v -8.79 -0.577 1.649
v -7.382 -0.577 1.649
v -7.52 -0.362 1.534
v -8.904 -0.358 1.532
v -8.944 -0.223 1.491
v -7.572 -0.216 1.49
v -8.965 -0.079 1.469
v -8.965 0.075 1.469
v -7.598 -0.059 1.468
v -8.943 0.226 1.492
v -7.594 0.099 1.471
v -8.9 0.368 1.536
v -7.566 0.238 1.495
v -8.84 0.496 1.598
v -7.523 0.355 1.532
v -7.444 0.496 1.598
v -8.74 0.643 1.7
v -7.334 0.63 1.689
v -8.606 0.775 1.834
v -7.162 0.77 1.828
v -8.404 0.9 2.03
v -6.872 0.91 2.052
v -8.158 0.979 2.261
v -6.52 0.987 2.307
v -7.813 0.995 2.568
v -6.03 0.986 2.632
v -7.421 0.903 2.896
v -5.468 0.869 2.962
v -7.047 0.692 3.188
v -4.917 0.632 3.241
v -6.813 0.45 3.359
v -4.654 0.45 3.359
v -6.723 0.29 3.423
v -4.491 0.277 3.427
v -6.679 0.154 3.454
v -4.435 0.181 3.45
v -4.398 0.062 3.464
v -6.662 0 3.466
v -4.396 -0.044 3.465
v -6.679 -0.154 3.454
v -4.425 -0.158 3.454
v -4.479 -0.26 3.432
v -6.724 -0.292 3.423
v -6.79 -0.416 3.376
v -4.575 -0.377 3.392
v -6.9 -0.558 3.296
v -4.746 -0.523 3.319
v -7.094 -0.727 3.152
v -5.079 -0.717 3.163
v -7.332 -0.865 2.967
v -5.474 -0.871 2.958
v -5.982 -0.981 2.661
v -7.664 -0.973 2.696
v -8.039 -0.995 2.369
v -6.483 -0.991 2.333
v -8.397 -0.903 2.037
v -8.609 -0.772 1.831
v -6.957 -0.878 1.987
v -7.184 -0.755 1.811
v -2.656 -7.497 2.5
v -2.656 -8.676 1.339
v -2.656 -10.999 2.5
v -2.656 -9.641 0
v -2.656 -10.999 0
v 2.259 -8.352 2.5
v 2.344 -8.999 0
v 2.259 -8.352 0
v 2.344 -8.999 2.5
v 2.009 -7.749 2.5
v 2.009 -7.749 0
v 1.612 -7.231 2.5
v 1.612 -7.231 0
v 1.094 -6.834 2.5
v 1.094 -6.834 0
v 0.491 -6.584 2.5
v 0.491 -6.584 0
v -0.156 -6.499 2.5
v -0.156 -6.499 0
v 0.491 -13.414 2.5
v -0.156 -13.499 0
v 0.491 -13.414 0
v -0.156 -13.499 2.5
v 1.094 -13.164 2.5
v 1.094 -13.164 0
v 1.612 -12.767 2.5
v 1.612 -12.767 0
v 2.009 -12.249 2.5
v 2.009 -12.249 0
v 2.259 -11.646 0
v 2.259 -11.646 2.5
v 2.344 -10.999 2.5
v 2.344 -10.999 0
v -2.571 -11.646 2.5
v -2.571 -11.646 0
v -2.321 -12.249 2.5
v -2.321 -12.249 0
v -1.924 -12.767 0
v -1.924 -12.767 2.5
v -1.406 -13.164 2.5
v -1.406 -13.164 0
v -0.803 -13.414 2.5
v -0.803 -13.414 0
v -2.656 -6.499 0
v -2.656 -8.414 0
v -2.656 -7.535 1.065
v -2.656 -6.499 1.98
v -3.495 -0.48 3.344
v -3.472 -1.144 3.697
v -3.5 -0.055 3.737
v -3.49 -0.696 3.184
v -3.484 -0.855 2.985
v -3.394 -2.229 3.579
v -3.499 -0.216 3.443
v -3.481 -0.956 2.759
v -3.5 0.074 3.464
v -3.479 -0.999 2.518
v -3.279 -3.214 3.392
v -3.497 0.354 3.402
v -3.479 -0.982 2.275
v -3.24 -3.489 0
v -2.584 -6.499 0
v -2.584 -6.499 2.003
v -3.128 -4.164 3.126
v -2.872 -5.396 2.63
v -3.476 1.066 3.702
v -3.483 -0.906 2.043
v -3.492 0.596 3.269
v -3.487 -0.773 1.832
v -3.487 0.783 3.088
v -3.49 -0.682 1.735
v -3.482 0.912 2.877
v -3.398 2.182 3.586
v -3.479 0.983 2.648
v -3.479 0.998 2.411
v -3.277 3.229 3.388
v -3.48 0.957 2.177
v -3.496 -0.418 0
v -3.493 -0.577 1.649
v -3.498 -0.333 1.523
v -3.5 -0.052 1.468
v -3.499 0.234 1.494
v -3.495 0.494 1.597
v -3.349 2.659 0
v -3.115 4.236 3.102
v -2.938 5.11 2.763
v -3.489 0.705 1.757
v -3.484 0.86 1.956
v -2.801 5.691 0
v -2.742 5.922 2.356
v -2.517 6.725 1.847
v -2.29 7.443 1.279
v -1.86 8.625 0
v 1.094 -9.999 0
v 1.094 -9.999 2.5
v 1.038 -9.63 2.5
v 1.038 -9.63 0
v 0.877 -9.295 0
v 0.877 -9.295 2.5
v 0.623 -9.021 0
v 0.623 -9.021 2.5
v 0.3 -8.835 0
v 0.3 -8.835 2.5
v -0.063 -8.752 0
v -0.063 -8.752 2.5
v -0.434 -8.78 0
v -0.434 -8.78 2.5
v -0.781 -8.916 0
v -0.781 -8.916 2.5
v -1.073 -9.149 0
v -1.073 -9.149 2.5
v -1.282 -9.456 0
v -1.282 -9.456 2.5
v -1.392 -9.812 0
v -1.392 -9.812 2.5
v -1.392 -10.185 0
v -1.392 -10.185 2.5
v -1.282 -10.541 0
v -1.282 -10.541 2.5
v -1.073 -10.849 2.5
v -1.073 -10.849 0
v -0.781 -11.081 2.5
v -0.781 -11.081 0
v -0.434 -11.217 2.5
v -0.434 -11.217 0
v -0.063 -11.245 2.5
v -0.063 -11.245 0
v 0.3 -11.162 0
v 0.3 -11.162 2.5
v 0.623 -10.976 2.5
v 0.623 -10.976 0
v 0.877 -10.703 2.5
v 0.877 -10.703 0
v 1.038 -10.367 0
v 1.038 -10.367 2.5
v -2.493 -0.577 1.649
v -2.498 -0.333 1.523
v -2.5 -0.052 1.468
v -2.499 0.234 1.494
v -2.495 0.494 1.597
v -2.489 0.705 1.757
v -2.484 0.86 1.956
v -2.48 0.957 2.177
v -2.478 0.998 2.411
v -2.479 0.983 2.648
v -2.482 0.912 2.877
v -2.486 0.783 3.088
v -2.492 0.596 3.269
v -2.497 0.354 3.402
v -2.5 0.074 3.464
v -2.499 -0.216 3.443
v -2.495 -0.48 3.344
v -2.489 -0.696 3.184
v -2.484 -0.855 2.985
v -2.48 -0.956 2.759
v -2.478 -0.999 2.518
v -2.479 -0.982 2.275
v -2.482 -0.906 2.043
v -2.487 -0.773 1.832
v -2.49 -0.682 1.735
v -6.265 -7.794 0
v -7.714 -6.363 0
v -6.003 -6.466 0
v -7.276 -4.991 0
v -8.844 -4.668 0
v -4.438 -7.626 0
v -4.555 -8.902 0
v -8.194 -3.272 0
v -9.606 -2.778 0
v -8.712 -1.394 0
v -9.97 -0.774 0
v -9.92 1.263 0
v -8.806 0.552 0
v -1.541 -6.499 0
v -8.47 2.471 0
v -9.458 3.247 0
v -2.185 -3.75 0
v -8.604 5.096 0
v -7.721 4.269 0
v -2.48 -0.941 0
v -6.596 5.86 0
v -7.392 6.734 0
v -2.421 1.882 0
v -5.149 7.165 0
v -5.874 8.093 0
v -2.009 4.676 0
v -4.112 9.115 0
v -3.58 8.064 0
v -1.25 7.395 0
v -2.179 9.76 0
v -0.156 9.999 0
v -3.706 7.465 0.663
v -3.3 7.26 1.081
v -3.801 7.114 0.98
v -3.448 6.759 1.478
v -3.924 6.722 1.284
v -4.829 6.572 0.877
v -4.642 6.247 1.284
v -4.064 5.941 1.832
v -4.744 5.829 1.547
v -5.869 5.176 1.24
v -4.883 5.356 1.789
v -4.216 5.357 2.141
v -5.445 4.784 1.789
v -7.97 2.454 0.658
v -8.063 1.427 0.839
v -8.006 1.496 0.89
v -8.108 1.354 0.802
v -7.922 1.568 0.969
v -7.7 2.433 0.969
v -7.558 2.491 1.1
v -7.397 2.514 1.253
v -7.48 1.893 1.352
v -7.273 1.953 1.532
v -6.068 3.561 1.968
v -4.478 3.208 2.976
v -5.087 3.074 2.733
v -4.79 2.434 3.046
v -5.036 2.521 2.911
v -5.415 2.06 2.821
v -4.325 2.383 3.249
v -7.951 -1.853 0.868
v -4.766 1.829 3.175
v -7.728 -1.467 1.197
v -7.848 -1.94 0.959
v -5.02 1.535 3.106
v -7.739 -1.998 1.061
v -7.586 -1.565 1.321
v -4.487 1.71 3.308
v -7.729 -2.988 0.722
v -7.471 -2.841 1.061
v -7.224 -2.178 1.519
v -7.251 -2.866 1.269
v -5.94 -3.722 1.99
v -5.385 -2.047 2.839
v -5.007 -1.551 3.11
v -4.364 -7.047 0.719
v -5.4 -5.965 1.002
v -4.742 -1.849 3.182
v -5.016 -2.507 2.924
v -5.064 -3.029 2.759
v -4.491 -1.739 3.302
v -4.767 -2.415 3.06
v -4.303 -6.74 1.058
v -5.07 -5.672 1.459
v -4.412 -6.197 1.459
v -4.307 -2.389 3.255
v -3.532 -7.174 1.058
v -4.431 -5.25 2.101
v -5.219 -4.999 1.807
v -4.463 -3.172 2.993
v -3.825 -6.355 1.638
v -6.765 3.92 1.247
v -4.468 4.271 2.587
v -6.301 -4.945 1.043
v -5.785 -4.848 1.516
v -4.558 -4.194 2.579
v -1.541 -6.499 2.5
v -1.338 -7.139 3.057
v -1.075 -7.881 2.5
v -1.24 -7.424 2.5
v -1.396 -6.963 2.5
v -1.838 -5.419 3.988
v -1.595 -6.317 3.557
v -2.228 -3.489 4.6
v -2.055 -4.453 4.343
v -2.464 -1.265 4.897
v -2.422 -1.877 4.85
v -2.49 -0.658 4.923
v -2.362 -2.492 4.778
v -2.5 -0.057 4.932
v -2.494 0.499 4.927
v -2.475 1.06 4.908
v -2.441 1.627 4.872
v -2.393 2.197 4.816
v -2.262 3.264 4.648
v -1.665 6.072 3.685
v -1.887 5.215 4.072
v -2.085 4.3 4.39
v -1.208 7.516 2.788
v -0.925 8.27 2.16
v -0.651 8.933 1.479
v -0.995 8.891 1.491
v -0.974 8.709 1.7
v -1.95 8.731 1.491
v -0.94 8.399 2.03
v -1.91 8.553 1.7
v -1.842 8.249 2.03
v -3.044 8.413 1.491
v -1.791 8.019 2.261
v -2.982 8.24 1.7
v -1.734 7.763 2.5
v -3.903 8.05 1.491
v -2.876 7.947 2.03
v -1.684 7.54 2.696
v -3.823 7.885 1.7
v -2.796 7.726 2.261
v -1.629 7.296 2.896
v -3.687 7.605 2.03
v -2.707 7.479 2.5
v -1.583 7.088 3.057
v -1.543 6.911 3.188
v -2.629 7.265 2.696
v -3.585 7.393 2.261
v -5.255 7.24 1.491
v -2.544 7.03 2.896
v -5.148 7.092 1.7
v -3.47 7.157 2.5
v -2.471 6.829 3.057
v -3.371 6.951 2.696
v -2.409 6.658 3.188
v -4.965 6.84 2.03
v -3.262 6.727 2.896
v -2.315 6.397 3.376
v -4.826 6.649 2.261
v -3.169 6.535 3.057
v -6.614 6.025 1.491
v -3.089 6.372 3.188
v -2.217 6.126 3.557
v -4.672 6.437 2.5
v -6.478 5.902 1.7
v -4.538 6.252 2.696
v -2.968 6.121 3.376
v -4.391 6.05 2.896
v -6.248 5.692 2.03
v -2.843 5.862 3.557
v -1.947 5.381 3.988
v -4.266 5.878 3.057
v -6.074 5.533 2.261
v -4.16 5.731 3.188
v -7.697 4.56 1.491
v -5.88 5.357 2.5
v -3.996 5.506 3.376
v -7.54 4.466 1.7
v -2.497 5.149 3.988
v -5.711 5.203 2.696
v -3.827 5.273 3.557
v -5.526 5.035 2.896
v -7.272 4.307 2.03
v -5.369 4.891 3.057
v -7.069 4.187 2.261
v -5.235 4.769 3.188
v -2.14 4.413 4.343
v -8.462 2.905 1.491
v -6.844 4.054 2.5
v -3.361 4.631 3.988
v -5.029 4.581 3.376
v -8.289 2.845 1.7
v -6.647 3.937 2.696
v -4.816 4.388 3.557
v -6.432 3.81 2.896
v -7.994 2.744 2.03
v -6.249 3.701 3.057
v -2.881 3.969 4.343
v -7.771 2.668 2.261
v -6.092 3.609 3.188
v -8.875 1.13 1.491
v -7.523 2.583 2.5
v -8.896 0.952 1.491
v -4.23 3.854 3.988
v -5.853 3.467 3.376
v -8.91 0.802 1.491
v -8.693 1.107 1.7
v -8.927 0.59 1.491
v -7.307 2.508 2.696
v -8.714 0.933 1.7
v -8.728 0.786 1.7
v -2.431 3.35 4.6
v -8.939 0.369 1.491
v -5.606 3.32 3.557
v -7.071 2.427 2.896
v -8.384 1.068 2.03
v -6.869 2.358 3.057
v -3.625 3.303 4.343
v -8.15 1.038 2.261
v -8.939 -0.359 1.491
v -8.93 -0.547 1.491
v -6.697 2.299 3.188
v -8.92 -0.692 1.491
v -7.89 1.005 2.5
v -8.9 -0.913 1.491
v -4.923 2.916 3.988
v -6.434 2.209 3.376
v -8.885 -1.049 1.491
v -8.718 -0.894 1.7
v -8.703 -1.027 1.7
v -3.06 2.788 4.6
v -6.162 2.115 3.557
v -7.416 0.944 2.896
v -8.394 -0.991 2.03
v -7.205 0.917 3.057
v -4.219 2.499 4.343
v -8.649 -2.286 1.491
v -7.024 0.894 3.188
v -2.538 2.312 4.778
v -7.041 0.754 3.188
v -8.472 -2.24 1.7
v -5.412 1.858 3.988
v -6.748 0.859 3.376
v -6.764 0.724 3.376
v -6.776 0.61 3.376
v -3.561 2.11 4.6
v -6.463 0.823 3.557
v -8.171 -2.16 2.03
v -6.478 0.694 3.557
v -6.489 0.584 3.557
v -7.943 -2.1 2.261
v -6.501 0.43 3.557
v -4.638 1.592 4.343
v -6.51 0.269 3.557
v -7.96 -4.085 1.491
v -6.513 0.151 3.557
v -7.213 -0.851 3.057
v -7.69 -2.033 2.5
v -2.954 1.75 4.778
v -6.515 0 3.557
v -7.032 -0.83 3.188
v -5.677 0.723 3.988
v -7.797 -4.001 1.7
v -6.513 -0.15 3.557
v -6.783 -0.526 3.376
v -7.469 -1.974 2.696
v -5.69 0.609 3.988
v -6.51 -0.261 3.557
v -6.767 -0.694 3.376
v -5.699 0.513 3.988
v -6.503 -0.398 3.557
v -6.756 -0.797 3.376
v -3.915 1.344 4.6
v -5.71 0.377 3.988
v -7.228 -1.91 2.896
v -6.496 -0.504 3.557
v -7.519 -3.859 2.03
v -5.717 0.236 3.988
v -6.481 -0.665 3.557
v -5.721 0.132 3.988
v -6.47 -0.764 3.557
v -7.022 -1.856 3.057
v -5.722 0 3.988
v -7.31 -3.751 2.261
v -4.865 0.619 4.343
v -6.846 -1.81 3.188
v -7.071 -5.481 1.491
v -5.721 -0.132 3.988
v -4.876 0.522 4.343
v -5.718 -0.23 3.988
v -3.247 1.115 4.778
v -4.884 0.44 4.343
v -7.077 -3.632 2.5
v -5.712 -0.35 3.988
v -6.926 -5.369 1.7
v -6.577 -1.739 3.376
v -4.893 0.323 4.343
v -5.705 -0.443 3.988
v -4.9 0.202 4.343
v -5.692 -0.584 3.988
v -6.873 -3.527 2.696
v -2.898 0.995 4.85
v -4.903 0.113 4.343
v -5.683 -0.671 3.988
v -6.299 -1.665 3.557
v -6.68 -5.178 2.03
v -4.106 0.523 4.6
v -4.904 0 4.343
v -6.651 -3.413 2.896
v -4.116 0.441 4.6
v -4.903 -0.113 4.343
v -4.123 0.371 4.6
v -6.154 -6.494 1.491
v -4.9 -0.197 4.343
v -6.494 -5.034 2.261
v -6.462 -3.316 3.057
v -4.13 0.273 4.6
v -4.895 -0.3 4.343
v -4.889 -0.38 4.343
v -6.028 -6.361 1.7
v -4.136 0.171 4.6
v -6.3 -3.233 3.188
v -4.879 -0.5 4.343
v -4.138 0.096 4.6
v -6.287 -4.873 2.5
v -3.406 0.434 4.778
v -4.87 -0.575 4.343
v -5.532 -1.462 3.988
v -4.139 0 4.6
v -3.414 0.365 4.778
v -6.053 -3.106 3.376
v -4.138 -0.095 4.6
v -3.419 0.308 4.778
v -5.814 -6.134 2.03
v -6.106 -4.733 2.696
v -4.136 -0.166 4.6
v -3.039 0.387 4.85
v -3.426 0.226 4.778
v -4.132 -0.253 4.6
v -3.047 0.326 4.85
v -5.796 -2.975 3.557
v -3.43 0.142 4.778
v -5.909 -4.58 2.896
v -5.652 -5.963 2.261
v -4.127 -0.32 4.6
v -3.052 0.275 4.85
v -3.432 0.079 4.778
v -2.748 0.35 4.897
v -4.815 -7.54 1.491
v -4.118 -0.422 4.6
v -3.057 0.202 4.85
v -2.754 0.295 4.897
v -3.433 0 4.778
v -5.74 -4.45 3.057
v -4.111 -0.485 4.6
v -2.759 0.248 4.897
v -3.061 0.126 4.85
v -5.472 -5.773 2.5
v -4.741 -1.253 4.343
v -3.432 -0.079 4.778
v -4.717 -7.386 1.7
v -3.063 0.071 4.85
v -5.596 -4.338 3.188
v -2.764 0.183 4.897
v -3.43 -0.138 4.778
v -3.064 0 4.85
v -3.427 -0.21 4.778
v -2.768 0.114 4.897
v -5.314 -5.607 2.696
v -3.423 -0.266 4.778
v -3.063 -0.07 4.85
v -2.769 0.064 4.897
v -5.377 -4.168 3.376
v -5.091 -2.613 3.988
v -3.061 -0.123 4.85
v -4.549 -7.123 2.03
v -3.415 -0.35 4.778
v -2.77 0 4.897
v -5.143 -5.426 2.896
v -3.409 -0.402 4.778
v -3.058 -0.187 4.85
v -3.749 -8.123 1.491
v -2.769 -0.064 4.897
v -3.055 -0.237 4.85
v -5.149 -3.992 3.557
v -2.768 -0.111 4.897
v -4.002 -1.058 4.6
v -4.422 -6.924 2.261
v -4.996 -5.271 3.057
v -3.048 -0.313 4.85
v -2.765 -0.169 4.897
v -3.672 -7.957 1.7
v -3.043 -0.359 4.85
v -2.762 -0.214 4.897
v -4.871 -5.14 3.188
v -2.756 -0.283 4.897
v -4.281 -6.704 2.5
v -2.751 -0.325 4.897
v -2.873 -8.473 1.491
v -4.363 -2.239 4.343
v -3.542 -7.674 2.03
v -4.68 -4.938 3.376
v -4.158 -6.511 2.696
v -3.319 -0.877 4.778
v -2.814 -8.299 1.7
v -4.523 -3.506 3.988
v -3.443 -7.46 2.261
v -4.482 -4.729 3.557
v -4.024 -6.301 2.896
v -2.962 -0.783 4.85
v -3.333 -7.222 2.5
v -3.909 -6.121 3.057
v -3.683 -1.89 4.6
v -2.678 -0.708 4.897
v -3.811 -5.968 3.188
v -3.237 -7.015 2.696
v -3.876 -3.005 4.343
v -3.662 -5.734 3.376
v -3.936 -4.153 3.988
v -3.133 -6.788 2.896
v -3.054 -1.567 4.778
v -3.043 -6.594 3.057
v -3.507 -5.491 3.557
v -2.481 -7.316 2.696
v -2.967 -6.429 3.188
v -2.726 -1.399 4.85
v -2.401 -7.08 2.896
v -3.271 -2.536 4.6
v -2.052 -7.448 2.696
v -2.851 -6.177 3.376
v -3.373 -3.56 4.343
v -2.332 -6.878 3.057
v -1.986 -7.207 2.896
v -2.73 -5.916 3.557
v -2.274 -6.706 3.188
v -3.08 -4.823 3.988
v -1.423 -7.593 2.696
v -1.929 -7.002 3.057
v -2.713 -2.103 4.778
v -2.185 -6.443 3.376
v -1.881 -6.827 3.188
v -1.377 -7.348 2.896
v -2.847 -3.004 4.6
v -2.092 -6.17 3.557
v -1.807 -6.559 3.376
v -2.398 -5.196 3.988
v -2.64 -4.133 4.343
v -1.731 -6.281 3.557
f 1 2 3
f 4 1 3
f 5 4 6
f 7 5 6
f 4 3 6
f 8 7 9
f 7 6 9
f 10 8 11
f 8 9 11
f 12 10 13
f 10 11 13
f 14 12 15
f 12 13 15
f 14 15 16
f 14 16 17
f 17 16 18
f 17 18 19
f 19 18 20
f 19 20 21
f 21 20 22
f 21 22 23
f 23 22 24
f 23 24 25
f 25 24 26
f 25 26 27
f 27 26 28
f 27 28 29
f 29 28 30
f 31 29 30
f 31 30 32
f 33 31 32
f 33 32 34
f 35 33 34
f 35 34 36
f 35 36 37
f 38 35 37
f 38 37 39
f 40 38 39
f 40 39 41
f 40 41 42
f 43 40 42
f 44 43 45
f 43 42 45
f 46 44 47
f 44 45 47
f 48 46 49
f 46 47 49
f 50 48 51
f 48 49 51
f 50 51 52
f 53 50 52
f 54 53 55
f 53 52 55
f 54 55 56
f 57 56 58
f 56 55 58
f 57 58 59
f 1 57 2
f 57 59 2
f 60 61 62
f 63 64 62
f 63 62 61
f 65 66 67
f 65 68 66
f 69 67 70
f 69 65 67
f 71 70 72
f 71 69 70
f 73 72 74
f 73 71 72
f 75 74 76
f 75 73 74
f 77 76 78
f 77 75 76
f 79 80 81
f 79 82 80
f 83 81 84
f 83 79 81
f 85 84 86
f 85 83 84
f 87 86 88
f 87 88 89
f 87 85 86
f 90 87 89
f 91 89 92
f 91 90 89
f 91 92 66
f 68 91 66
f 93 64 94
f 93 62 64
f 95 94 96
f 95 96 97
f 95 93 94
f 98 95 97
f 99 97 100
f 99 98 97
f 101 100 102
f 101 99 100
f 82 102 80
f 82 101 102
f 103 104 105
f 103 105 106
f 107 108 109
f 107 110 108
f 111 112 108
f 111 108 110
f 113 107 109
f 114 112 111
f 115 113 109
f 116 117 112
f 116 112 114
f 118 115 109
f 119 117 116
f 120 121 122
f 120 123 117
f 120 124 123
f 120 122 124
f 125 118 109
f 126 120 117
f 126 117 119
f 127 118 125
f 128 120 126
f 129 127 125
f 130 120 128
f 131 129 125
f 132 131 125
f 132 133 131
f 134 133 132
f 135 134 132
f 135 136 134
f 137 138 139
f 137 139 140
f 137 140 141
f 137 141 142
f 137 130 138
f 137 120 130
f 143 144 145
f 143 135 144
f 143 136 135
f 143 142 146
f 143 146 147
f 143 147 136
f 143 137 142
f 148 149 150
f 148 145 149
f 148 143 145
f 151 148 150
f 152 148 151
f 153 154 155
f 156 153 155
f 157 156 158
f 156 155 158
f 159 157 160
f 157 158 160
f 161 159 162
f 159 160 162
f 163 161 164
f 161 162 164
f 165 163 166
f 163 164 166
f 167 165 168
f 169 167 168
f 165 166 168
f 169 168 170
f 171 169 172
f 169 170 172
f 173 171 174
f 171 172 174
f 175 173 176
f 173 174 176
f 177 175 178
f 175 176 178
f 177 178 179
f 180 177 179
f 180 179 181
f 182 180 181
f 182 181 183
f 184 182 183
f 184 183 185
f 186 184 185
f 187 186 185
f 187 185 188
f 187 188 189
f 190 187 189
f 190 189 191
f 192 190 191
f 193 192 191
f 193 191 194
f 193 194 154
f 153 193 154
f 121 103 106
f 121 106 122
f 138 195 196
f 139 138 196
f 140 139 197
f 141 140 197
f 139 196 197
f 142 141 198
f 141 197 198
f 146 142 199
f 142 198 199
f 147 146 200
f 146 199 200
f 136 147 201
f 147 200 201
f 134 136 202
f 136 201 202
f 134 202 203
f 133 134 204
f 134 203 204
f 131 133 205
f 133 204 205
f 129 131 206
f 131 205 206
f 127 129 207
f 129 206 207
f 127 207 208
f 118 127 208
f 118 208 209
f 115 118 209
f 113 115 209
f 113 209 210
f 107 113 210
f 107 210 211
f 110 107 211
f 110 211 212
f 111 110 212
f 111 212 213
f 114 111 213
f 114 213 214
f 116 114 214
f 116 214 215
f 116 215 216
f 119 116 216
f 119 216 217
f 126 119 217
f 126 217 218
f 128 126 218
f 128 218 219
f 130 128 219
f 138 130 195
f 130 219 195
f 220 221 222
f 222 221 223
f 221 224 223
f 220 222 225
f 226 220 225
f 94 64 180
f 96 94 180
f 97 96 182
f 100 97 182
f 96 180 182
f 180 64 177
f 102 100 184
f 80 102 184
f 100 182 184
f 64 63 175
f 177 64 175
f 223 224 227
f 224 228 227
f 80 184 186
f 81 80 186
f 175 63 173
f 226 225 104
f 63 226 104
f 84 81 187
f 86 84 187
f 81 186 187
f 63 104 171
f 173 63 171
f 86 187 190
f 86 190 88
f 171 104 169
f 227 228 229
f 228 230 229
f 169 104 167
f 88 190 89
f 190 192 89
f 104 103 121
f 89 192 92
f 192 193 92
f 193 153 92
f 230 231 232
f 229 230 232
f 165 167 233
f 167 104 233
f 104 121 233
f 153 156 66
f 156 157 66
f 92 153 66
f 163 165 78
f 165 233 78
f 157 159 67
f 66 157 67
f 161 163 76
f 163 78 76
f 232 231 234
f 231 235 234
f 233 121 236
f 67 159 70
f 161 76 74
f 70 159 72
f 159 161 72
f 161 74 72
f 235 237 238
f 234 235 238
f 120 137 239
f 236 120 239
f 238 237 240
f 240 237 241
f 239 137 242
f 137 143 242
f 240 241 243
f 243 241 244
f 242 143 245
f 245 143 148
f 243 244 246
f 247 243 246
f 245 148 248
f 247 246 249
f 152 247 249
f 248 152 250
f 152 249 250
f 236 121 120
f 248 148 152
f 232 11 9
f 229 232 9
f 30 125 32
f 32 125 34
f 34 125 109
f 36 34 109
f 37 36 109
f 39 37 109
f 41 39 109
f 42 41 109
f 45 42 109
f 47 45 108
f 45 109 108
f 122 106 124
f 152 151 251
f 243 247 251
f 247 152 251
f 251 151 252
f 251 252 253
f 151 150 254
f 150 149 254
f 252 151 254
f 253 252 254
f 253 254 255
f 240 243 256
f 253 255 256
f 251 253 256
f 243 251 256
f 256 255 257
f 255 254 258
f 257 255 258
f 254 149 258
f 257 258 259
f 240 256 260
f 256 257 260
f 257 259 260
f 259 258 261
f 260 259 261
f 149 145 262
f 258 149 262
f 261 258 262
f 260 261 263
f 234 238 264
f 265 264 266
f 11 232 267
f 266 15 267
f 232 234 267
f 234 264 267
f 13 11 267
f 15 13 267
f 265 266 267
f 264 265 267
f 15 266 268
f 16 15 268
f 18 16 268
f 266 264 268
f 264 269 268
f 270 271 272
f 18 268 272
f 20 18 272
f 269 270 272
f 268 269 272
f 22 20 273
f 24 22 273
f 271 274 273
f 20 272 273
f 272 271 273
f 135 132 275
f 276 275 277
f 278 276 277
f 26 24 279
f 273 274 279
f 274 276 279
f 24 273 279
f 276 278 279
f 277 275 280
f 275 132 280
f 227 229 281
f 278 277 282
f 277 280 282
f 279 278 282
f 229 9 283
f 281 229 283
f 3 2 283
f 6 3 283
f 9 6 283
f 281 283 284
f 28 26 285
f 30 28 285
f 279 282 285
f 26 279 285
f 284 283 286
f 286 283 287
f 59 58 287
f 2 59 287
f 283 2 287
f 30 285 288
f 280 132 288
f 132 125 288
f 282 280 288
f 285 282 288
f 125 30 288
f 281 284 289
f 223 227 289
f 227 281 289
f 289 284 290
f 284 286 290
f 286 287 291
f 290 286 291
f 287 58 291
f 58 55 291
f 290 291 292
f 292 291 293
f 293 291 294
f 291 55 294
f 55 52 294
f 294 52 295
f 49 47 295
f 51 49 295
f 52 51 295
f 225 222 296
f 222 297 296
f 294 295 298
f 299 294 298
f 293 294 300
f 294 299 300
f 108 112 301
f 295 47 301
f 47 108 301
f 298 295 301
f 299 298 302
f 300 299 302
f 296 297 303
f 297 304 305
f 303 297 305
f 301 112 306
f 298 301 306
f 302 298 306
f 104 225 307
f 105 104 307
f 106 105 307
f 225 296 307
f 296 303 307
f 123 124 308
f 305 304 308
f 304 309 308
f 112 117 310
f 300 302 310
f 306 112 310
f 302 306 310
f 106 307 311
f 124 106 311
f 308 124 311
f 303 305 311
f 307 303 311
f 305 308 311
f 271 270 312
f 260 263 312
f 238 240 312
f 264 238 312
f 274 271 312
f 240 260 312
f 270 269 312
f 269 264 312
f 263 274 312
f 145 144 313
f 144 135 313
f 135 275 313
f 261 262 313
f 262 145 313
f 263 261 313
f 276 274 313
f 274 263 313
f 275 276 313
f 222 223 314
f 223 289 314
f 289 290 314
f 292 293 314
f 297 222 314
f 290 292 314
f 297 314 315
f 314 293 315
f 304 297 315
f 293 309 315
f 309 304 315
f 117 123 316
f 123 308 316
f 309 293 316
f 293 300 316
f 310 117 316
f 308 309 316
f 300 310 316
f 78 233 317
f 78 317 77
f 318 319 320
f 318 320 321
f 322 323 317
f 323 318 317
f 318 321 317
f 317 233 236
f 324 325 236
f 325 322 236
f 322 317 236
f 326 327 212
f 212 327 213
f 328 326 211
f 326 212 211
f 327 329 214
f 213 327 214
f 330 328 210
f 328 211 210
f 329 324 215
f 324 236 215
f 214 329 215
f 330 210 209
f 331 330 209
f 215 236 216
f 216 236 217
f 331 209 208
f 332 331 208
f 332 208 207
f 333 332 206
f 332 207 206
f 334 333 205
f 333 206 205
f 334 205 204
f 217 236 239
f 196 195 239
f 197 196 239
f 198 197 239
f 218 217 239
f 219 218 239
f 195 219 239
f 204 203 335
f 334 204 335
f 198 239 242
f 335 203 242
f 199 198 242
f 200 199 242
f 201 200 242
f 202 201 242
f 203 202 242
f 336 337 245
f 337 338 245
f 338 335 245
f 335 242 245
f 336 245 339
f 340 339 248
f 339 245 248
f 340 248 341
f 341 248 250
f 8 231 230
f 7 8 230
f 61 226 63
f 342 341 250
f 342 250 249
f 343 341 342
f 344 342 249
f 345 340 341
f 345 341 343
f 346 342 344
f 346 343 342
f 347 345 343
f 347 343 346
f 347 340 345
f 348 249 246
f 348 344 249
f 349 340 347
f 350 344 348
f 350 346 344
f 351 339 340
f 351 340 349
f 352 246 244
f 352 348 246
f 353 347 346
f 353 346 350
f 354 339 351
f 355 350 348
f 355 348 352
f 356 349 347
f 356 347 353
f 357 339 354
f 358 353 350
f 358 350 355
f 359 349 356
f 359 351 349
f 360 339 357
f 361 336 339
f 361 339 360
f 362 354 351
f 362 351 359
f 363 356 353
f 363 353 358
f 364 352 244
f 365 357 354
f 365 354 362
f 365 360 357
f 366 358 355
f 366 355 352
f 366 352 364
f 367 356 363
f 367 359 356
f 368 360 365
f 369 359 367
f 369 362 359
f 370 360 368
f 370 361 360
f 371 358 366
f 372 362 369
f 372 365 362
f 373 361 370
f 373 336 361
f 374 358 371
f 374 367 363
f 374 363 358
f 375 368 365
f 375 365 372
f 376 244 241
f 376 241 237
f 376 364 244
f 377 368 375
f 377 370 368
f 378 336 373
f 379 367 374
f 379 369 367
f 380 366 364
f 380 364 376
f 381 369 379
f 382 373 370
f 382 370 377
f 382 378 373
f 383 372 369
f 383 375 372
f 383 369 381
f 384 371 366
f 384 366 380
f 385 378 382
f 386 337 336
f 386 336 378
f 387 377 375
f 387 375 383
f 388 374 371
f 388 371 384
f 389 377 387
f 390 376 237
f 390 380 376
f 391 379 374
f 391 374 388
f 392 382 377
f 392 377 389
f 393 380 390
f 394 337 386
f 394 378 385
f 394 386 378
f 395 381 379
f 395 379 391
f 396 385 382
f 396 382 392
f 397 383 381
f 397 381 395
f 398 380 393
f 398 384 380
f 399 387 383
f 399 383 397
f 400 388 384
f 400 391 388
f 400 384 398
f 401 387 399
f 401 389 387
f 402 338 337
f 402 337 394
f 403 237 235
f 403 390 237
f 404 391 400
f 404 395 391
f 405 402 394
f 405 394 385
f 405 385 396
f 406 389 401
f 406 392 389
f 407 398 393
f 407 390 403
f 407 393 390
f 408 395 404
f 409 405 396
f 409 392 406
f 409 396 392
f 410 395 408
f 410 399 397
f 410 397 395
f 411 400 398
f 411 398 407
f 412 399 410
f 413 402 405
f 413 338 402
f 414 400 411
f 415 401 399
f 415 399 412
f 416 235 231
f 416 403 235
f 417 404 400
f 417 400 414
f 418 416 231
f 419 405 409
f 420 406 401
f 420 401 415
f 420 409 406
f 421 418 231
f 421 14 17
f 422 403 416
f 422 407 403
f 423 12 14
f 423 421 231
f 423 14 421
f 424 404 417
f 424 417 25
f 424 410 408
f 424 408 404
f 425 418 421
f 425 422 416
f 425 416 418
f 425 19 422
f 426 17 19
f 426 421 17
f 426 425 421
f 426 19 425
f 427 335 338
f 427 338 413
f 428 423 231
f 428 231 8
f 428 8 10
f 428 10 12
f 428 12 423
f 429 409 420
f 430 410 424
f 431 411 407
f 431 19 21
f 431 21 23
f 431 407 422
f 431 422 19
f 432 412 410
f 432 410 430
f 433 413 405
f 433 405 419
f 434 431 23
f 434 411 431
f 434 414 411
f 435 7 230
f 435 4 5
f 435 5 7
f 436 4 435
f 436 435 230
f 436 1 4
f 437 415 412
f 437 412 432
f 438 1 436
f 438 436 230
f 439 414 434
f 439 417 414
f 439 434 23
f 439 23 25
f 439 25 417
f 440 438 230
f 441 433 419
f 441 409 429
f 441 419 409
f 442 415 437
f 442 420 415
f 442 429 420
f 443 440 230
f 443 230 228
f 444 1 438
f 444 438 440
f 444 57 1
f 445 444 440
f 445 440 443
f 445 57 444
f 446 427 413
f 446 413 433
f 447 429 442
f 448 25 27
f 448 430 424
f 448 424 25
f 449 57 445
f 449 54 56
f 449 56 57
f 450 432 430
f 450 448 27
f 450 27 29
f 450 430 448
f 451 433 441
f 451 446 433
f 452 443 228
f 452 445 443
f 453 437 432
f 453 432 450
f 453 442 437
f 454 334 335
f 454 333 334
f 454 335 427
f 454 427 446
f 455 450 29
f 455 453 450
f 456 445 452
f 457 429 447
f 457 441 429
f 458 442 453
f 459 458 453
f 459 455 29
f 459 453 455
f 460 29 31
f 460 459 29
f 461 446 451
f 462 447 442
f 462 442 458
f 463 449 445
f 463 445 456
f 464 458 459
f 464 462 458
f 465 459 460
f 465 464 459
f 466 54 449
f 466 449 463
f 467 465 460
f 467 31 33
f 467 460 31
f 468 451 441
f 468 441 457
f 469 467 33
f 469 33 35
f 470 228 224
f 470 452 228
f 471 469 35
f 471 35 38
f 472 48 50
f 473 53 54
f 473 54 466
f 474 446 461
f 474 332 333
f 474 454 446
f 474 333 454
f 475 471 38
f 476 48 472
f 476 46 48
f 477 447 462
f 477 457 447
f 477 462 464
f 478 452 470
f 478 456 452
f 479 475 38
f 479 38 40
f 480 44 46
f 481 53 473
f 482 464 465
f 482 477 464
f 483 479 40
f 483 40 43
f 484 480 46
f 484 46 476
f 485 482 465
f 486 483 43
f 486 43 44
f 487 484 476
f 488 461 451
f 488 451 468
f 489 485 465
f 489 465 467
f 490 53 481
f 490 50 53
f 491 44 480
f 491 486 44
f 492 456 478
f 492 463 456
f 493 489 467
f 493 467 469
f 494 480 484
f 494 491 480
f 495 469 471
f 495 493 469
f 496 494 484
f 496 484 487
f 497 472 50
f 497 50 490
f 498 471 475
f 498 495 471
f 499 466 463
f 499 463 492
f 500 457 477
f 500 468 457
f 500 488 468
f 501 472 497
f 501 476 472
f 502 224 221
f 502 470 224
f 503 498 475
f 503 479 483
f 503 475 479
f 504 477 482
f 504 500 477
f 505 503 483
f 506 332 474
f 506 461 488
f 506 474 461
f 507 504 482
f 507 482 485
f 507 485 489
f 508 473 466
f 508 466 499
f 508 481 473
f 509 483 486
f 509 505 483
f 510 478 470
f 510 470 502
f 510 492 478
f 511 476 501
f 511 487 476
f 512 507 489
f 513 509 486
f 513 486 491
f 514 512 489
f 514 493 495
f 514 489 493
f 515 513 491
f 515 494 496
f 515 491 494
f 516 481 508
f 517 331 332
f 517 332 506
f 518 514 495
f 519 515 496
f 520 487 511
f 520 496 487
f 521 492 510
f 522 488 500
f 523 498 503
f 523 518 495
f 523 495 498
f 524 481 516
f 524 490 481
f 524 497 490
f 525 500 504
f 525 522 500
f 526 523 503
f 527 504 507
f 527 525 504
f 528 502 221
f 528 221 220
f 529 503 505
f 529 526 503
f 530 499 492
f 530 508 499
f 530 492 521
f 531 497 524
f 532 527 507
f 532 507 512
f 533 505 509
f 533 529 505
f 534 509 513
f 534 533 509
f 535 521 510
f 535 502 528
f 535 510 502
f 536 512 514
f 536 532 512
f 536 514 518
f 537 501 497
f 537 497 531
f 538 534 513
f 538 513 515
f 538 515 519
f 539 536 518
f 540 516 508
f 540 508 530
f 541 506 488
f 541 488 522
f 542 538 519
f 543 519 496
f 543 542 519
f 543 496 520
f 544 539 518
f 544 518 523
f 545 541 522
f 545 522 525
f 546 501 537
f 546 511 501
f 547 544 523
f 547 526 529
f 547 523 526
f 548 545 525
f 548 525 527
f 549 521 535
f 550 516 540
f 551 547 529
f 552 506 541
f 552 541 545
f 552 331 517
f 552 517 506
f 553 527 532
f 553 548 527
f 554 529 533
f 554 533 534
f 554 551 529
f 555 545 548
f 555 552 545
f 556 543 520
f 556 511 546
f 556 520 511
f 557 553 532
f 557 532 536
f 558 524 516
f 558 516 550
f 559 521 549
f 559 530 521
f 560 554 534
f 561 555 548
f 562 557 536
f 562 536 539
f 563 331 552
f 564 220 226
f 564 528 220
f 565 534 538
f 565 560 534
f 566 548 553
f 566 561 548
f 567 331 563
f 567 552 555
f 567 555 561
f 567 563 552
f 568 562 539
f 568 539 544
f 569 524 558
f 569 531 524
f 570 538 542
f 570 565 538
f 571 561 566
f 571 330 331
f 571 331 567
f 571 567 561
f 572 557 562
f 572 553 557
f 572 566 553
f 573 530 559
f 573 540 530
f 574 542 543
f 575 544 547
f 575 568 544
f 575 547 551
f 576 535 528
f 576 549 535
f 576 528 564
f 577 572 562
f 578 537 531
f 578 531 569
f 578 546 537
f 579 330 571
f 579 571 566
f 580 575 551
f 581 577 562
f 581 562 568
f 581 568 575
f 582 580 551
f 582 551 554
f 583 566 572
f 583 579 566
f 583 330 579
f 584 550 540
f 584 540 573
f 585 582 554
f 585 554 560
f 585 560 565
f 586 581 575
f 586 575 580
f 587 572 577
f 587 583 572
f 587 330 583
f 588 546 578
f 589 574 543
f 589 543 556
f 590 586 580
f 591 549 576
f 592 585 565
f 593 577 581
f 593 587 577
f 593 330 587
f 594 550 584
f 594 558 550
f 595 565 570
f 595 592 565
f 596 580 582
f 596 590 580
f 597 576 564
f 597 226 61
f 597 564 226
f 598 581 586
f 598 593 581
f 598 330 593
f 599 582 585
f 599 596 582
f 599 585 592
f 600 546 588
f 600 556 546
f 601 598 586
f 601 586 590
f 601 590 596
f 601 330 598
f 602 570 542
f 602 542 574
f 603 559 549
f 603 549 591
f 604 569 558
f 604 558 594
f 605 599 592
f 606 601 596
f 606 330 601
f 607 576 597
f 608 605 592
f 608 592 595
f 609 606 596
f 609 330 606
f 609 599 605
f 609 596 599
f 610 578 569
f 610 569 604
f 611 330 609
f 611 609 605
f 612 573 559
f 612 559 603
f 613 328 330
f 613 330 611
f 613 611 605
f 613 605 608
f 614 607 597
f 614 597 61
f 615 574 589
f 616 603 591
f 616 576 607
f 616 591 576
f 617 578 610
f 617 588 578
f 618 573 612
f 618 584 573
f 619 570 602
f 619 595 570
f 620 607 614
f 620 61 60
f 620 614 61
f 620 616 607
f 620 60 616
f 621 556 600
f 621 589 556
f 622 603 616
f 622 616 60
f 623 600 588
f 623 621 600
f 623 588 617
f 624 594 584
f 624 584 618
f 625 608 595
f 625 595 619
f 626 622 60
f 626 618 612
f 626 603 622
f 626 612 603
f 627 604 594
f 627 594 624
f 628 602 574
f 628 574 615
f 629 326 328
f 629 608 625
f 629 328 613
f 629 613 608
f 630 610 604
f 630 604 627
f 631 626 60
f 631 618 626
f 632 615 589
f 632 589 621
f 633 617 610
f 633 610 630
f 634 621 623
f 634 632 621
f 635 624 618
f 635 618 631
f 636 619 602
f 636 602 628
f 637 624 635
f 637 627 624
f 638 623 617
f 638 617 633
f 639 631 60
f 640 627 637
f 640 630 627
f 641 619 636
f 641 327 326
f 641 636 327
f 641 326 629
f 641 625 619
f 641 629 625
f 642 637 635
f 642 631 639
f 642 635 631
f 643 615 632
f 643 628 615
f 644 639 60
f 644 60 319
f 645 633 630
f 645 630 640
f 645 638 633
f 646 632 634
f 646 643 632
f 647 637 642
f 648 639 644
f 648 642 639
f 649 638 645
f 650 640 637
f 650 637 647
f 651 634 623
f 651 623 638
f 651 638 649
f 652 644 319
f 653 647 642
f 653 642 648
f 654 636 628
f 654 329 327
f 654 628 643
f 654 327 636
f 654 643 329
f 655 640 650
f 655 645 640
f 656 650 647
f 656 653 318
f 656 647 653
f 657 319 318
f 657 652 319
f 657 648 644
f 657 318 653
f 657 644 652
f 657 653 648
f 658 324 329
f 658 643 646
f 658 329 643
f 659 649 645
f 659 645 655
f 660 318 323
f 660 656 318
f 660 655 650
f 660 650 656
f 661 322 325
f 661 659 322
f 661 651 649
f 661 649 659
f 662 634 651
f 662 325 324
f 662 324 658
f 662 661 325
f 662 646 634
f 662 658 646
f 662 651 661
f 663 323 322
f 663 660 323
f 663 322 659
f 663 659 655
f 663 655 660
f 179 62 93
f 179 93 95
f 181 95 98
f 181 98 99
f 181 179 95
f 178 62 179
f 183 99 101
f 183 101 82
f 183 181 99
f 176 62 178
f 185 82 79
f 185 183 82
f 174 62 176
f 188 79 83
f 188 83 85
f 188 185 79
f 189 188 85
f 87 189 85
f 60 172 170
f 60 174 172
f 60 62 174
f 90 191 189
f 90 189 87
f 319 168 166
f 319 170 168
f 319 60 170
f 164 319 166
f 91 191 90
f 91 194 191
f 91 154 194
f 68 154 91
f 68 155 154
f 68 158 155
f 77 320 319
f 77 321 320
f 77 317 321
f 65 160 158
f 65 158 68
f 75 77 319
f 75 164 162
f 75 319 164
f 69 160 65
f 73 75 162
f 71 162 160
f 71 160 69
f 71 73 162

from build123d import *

# Parameters (mm, degrees)
BOSS_EXTRUDE1_DEPTH = 5
FILLET1_R           = 10
SHELL1_T            = -1
SKETCH4_R           = 1
CUT_EXTRUDE1_DEPTH  = 15.976807967
SKETCH5_W           = 5
SKETCH5_H           = 7
BOSS_EXTRUDE2_DEPTH = 2.5
SKETCH7_R           = 1.25
CUT_EXTRUDE3_DEPTH  = 17.98431764
FILLET4_R           = 2.5


# Some blends are built 0.0001 mm under size
with BuildPart() as part:
    # Sketch1 → Boss-Extrude1 (new body)
    with BuildSketch(Plane.XY):
        with BuildLine():
            ThreePointArc((-0.15625, 9.998779222), (-10, 0), (-0.15625, -9.998779222))
            ThreePointArc((-0.15625, -9.998779222), (-2.5, 0), (-0.15625, 9.998779222))
        make_face()
    extrude(amount=BOSS_EXTRUDE1_DEPTH)

    # Fillet1
    # the kernel refuses this fillet: 10 mm, written as the material it takes off along each edge
    with BuildSketch(Plane(origin=(0, 0, 5), x_dir=(0.9999950652018581, 0.003141587485880102, 0), z_dir=(0.003141587485880102, -0.9999950652018581, 0))) as fillet1_piece_1:
        with BuildLine():
            CenterArc((1.339745962, -10), FILLET1_R, 30, 60)
            Line((1.339745962, 0), (1.339745962, 0.2))
            Line((1.339745962, 0.2), (10, 0.2))
            Line((10, 0.2), (10.2, 0))
            ThreePointArc((10.2, 0), (10.2, -2.5), (10.173205081, -4.9))
            Line((10.173205081, -4.9), (10, -5))
        make_face()
    revolve(axis=Axis((0, 0, 5), (0, 0, 1)), revolution_arc=359.64, mode=Mode.SUBTRACT)

    # Shell1
    shell1_openings = [part.faces().sort_by_distance(p)[0] for p in [
        (-5.162614347, 0, 0),
    ]]
    offset(amount=SHELL1_T, openings=shell1_openings, kind=Kind.INTERSECTION)

    # Sketch4 → Cut-Extrude1 (cut, through all)
    with BuildSketch(Plane(origin=(0, 0, 0), x_dir=(0, 0, -1), z_dir=(1, 0, 0))):
        with Locations(Location((-2.466231233, 0, 0), (0, 0, 324.775001353))):
            Circle(SKETCH4_R)
    extrude(amount=-CUT_EXTRUDE1_DEPTH, mode=Mode.SUBTRACT)

    # Sketch5 → Boss-Extrude2 (add)
    with BuildSketch(Plane.XY):
        with Locations((-0.15625, -9.998779222)):
            Rectangle(SKETCH5_W, SKETCH5_H)
    extrude(amount=BOSS_EXTRUDE2_DEPTH)

    # Sketch7 → Cut-Extrude3 (cut, through all)
    with BuildSketch(Plane.XY.offset(2.5)):
        with Locations((-0.15625, -9.998779222)):
            Circle(SKETCH7_R)
    extrude(amount=-CUT_EXTRUDE3_DEPTH, mode=Mode.SUBTRACT)

    # Fillet4
    fillet4_edges = [part.edges().sort_by_distance(p)[0] for p in [
        (-2.65625, -13.498779222, 1.25),
        (2.34375, -13.498779222, 1.25),
        (2.34375, -6.498779222, 1.25),
    ]]
    fillet(fillet4_edges, radius=FILLET4_R - 0.0001)  # a hair under: the kernel refuses the full size


solid = part.part
